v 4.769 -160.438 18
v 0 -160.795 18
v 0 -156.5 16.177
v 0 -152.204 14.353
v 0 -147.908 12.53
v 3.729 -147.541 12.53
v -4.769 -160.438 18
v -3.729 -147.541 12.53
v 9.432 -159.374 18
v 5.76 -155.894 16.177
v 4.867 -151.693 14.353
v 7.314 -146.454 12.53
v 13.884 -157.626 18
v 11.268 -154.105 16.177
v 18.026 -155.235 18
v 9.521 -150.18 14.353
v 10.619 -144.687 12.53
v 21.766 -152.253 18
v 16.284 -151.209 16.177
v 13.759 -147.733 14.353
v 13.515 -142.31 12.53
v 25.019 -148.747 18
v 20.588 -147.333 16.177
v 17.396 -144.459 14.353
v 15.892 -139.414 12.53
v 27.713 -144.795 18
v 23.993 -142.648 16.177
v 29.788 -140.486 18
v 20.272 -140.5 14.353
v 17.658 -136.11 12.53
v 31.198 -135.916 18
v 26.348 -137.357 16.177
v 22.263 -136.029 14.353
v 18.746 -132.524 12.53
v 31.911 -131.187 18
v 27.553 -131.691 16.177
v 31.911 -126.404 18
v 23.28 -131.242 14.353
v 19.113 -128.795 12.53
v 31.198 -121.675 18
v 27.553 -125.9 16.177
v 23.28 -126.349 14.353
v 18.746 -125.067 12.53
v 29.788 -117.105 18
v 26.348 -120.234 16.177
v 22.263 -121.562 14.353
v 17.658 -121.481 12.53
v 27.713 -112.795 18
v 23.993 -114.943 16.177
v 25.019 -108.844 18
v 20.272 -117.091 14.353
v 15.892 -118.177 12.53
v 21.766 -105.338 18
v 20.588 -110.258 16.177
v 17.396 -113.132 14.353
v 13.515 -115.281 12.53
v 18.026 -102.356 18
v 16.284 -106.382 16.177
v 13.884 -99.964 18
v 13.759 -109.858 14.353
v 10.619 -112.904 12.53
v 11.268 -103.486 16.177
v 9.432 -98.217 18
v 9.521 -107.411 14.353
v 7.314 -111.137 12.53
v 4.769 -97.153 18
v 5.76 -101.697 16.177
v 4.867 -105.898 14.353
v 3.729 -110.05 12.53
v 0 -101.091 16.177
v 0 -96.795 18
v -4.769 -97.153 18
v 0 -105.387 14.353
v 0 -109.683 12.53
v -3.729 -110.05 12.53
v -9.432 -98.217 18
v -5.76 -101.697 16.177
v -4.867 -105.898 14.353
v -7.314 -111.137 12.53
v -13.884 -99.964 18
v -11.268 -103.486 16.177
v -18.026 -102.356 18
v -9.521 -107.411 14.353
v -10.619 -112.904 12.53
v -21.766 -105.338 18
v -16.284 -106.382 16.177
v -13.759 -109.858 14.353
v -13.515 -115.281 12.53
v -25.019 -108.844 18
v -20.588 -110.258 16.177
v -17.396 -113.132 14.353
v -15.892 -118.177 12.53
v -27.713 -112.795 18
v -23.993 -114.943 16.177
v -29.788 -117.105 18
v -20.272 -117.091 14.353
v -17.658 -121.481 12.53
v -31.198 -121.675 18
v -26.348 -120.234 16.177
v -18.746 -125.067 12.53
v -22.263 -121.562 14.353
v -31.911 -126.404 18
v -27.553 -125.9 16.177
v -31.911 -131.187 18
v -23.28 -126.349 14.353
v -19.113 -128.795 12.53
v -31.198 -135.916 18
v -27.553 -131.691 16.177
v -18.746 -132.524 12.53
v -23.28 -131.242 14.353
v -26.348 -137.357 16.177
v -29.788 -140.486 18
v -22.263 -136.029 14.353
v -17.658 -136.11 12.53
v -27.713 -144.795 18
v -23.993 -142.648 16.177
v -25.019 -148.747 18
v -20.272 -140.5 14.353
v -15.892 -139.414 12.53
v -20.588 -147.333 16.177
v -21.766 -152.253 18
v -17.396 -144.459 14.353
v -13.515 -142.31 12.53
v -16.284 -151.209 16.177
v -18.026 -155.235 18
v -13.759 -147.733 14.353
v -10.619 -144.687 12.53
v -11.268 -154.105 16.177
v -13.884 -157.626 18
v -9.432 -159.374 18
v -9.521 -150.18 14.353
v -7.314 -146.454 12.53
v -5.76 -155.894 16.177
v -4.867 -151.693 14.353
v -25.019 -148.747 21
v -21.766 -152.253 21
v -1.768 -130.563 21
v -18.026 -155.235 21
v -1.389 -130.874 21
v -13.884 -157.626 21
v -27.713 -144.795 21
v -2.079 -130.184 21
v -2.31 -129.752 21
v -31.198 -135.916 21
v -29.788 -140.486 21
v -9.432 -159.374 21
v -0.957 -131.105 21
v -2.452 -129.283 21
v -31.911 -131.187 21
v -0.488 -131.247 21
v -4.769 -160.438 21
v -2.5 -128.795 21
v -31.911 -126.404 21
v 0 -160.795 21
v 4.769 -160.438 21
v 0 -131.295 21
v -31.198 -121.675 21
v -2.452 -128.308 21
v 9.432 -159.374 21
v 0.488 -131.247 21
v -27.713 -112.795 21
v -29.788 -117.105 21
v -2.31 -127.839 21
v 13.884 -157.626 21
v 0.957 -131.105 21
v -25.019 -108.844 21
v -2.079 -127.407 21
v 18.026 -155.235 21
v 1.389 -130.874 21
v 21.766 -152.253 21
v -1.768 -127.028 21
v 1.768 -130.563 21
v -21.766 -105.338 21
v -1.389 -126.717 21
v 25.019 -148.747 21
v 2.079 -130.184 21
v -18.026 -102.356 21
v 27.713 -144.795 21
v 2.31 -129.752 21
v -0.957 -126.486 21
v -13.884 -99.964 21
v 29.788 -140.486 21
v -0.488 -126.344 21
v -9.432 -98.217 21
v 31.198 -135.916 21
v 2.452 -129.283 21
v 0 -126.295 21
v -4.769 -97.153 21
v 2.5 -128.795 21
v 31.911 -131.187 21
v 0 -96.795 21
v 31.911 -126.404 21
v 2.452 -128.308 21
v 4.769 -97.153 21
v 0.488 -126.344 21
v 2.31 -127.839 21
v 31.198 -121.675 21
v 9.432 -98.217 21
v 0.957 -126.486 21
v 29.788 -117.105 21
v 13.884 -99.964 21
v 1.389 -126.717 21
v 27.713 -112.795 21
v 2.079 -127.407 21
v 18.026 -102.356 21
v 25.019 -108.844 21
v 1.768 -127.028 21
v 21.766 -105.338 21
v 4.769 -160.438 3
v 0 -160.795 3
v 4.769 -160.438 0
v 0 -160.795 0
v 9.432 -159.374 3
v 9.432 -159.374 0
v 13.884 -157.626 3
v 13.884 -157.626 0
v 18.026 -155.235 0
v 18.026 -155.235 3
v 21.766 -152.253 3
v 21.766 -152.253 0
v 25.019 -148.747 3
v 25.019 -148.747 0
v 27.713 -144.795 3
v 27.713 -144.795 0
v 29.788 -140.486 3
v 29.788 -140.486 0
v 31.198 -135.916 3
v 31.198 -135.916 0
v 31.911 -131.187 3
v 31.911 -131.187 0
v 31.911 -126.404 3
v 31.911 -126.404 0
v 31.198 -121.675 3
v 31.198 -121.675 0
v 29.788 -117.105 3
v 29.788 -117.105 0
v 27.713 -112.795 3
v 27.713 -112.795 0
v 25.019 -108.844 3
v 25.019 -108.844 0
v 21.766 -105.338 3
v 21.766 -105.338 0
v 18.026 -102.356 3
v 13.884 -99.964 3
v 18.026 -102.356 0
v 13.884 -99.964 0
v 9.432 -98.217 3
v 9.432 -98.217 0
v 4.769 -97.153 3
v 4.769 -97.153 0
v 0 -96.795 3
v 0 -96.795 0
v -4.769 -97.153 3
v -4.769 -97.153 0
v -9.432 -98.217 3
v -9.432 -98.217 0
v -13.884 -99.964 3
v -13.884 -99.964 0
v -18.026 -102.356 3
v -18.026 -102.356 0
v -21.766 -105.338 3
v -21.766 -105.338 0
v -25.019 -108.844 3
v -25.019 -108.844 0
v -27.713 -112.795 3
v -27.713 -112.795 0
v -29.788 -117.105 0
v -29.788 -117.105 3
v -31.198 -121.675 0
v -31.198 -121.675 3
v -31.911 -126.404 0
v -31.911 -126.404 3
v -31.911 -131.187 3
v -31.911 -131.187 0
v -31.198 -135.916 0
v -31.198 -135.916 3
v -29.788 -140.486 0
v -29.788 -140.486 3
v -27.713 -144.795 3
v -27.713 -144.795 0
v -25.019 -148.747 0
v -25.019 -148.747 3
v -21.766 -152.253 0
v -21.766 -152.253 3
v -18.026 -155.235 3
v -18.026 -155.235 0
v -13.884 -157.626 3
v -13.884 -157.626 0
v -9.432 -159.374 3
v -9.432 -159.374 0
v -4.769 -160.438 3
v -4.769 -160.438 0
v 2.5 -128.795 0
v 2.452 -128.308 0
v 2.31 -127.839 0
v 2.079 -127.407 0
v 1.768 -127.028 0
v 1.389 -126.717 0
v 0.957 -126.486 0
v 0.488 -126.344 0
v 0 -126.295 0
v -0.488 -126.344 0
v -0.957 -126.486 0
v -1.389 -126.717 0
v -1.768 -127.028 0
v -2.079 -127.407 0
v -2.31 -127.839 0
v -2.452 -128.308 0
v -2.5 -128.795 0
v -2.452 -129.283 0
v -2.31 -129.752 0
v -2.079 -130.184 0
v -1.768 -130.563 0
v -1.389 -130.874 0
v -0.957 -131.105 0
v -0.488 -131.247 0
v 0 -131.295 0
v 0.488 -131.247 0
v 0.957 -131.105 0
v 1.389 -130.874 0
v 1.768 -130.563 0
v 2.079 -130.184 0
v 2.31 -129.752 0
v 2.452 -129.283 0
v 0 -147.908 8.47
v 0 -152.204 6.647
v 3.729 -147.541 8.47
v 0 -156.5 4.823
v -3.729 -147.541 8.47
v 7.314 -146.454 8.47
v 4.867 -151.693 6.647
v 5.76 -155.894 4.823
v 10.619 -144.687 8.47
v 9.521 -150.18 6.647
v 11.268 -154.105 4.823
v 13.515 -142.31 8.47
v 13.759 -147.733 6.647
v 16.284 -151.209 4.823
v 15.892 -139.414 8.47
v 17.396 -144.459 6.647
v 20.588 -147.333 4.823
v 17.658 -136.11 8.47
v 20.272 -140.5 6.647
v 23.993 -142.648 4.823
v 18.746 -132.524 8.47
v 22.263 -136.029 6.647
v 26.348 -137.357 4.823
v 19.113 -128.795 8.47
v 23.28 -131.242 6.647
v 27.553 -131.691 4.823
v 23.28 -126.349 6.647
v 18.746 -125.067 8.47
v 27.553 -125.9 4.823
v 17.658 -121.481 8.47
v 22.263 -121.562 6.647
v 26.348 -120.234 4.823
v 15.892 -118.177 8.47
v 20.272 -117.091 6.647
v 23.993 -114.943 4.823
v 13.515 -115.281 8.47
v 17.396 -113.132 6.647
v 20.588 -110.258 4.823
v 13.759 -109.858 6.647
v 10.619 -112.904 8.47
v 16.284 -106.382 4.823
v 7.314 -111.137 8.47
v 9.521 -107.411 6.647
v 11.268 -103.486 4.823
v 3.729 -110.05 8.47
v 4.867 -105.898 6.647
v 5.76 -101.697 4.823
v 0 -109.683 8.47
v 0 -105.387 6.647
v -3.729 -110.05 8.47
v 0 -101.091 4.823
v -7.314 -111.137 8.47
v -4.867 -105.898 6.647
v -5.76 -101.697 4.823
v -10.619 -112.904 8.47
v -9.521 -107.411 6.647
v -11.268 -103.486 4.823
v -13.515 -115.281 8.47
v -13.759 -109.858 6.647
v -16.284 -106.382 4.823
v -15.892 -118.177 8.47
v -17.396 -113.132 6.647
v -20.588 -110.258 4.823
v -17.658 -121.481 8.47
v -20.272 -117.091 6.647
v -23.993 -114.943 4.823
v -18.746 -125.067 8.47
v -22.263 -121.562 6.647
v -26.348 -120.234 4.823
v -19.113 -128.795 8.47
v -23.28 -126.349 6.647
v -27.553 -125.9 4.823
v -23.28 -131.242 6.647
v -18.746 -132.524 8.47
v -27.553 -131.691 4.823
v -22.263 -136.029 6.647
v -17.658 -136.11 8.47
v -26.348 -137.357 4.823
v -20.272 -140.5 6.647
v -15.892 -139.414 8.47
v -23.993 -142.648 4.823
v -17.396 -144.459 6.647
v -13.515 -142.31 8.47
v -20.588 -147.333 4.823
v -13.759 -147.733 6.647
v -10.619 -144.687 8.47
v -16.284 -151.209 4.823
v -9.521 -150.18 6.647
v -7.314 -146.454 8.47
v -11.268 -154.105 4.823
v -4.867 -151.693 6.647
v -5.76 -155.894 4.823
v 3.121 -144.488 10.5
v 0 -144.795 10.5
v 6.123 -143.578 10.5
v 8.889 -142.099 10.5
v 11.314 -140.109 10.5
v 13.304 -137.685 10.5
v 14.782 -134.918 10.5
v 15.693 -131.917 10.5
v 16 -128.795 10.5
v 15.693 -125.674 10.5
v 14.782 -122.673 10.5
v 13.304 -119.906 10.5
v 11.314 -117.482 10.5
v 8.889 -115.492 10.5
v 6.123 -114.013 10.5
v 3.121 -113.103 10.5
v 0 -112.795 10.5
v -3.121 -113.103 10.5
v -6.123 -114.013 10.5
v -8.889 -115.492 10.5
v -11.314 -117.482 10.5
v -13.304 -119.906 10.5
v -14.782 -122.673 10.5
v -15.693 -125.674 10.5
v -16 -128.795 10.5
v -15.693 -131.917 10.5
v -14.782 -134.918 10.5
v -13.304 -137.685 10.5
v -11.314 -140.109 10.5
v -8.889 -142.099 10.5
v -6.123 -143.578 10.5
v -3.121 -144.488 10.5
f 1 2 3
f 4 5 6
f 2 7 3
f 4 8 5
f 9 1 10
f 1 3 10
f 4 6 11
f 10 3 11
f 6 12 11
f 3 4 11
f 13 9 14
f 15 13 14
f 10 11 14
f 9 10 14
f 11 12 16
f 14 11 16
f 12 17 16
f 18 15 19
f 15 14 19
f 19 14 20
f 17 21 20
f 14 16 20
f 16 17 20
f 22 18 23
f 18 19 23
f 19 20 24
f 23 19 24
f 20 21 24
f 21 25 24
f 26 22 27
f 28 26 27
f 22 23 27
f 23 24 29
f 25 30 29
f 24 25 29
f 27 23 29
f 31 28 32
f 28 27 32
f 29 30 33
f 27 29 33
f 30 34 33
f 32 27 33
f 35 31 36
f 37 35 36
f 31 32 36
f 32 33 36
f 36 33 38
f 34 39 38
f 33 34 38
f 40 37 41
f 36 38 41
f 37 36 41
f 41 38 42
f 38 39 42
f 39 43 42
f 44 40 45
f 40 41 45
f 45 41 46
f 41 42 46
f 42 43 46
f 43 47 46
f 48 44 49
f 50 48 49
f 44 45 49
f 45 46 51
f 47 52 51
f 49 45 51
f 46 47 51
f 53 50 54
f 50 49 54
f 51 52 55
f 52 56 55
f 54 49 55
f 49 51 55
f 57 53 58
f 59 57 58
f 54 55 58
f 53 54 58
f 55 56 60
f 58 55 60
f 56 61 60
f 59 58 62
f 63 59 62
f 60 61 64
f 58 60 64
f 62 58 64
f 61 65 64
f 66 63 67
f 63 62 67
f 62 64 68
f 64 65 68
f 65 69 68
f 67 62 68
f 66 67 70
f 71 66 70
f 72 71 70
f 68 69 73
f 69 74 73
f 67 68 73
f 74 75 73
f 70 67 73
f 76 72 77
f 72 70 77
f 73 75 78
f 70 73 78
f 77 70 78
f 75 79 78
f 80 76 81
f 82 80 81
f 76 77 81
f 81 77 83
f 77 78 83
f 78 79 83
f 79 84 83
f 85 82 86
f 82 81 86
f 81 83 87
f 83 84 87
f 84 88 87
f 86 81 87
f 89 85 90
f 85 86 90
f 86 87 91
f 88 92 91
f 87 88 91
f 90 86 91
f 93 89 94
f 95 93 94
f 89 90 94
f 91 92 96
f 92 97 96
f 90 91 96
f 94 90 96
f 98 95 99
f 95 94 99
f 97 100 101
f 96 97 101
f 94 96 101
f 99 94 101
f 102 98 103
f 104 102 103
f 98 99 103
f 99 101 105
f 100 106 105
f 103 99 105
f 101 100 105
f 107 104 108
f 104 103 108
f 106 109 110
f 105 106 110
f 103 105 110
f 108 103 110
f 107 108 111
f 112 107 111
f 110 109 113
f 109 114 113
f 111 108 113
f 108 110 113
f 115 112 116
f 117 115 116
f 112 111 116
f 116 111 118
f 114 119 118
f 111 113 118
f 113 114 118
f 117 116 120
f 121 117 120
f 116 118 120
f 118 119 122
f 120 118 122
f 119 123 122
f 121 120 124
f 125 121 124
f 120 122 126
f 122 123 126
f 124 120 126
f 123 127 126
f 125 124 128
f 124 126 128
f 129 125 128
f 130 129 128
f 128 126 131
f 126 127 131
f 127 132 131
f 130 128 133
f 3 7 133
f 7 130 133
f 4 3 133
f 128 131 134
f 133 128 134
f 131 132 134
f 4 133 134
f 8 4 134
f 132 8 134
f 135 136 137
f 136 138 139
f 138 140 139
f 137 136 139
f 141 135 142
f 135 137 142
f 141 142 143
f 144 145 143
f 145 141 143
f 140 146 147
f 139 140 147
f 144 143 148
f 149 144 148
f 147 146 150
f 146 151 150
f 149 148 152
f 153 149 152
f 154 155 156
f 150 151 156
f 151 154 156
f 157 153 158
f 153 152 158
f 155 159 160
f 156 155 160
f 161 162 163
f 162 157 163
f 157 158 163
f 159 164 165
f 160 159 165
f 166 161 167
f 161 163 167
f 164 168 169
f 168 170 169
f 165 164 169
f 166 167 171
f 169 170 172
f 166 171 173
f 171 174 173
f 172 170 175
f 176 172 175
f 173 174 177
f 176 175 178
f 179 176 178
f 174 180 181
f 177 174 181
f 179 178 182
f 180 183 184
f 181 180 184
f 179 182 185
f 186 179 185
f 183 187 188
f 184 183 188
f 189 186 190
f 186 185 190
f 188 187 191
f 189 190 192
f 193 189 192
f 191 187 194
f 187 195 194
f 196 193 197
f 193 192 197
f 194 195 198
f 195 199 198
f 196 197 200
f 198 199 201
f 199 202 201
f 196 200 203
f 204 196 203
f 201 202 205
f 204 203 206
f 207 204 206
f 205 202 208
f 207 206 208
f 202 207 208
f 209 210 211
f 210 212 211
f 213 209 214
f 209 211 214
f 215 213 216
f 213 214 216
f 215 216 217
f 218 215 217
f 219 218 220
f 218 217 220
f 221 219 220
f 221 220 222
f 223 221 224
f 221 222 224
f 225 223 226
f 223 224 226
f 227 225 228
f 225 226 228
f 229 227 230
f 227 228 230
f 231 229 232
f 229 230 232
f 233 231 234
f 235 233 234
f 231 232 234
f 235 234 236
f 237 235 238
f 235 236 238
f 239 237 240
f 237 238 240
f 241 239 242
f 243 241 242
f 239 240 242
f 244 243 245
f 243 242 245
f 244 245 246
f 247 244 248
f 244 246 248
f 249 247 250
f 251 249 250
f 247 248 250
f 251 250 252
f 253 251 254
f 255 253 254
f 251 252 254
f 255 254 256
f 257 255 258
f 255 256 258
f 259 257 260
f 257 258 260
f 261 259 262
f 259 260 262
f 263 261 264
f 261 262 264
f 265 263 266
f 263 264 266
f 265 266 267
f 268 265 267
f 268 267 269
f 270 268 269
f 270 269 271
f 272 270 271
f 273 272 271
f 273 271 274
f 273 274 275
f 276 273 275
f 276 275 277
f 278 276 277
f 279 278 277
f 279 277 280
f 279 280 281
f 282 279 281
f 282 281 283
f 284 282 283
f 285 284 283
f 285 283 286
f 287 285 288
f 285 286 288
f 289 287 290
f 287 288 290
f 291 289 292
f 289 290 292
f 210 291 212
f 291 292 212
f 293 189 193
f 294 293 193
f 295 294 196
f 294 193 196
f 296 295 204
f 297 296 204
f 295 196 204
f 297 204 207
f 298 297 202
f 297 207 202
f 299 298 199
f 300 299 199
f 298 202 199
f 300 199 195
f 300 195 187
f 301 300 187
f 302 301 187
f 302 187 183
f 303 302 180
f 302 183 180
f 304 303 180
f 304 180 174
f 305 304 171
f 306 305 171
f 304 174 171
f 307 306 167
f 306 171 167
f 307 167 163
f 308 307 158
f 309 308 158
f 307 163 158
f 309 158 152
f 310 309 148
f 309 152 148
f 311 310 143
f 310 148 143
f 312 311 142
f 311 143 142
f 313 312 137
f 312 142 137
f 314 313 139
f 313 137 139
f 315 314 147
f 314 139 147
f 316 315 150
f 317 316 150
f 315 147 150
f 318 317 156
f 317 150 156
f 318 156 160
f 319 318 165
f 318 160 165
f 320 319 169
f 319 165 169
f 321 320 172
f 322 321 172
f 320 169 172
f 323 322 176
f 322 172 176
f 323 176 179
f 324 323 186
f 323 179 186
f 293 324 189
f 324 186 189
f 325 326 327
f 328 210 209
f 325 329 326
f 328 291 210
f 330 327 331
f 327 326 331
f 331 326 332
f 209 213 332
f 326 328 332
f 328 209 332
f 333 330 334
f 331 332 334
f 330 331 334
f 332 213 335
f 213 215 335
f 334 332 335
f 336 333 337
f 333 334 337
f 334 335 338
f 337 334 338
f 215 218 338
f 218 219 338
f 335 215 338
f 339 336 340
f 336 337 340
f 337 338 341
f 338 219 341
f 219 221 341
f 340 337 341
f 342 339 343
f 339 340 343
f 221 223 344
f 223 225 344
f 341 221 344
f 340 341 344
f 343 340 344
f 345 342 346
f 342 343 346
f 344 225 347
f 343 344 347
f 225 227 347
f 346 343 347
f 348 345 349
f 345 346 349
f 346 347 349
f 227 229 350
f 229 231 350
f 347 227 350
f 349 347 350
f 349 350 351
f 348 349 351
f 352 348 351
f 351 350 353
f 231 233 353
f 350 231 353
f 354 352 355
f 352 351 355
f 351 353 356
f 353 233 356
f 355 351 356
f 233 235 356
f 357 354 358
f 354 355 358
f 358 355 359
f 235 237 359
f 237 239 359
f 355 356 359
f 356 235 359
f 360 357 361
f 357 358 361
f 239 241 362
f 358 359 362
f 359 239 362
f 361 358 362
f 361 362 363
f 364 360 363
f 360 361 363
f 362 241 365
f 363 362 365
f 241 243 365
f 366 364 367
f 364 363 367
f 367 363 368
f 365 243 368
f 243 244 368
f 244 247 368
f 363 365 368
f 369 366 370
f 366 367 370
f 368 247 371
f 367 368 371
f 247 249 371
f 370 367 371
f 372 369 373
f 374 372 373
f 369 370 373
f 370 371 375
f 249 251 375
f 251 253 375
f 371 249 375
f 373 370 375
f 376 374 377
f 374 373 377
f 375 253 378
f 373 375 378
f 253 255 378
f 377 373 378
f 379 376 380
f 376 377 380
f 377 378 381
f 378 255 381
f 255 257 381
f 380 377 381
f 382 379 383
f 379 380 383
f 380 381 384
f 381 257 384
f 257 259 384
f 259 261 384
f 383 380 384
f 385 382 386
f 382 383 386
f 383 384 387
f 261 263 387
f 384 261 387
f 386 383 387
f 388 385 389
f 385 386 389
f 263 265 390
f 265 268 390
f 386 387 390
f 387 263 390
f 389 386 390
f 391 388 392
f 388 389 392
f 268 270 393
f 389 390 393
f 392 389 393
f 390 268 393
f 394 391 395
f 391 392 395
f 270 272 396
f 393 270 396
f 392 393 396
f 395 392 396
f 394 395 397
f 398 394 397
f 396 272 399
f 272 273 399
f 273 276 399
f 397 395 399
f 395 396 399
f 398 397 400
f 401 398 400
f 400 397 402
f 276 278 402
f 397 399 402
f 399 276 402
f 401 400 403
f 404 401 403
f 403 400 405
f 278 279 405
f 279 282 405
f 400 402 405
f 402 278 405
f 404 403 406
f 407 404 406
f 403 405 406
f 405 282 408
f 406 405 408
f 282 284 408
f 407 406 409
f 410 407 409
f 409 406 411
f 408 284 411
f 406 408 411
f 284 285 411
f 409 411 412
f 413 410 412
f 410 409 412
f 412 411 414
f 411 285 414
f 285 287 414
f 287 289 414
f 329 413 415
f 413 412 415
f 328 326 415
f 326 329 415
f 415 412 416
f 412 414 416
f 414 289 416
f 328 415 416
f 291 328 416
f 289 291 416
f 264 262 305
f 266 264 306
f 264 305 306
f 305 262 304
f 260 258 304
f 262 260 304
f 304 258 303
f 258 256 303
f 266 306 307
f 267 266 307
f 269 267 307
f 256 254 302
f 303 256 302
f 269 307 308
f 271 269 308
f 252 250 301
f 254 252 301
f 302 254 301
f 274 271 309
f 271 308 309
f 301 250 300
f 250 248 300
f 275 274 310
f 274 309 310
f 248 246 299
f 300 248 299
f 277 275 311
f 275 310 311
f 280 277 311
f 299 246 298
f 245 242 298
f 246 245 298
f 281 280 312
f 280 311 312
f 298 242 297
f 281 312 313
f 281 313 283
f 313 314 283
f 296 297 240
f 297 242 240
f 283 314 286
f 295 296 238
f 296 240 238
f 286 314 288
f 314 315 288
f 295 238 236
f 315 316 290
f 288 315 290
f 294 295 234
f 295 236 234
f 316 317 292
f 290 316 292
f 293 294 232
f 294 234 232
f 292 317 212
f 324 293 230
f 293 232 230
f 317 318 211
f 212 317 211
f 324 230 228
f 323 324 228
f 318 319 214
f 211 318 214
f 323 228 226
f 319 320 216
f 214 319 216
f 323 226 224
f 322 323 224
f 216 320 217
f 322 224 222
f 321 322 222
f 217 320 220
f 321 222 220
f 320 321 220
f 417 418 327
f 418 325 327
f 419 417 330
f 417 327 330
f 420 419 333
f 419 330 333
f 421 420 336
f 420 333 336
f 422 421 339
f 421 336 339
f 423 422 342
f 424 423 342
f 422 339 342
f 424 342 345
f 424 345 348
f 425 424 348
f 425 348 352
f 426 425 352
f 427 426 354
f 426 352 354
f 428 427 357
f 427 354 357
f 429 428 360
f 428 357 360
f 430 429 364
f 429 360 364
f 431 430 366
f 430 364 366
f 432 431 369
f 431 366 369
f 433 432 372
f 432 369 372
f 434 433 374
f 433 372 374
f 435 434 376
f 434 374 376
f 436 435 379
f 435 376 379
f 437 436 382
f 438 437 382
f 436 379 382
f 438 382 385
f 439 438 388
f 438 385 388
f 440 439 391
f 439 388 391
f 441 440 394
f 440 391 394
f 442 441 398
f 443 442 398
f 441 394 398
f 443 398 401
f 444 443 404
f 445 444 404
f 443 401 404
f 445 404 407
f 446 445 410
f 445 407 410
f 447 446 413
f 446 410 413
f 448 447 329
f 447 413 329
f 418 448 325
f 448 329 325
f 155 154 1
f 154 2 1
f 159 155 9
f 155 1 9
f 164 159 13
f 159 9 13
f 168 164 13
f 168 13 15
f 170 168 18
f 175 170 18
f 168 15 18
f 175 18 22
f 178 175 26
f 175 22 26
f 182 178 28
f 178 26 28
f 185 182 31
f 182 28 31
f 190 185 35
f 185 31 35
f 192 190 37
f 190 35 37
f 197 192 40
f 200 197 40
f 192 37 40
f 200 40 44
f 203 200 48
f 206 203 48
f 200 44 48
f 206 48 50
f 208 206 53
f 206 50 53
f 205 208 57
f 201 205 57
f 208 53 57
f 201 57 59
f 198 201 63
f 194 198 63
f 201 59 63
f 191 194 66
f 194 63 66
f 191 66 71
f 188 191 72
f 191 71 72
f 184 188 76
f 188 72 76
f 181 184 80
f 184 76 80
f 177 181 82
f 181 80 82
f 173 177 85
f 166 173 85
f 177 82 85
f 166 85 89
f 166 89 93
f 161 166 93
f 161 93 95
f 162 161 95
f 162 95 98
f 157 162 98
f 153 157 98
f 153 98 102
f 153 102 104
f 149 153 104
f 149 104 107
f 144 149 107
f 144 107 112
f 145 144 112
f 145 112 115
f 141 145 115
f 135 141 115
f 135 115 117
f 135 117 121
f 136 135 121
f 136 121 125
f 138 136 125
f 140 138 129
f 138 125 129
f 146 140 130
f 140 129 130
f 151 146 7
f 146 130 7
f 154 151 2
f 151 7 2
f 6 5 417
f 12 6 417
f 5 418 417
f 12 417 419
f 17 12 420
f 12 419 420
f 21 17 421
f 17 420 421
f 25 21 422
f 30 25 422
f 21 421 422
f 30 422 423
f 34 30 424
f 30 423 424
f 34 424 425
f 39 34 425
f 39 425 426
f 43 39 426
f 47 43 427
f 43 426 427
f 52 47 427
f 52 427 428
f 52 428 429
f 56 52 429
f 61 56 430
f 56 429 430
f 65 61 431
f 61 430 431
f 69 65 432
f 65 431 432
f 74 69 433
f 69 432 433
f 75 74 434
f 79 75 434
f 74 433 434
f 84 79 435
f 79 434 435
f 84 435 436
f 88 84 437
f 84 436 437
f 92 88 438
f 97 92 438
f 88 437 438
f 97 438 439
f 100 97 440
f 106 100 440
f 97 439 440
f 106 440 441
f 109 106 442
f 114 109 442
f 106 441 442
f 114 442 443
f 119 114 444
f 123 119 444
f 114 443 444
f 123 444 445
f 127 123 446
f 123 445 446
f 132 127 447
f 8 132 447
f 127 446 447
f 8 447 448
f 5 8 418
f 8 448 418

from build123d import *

# Parameters (mm, degrees)
F2_R     = 2.5
F3_DEPTH = 21


with BuildPart() as f1:
    # F0 (on Right) → F1 (revolve)
    with BuildSketch(Plane.YZ):
        Polygon((-160.7954752429, 0), (-128.7954752429, 0), (-128.7954752429, 21), (-160.7954752429, 21), (-160.7954752429, 18), (-147.9084072946, 12.5297642012), (-144.7954752429, 10.5), (-147.9084072946, 8.4702381086), (-160.7954752429, 3.0000023098), align=None)
    revolve(axis=Axis((0, -128.7954752429, 10.5), (0, 0, 1)))

    # F2 (on face) → F3 (cut, through all)
    with BuildSketch(Plane.XY.offset(21)):
        with Locations((0, -128.7954752429)):
            Circle(F2_R)
    extrude(amount=-F3_DEPTH, mode=Mode.SUBTRACT)


solid = f1.part
